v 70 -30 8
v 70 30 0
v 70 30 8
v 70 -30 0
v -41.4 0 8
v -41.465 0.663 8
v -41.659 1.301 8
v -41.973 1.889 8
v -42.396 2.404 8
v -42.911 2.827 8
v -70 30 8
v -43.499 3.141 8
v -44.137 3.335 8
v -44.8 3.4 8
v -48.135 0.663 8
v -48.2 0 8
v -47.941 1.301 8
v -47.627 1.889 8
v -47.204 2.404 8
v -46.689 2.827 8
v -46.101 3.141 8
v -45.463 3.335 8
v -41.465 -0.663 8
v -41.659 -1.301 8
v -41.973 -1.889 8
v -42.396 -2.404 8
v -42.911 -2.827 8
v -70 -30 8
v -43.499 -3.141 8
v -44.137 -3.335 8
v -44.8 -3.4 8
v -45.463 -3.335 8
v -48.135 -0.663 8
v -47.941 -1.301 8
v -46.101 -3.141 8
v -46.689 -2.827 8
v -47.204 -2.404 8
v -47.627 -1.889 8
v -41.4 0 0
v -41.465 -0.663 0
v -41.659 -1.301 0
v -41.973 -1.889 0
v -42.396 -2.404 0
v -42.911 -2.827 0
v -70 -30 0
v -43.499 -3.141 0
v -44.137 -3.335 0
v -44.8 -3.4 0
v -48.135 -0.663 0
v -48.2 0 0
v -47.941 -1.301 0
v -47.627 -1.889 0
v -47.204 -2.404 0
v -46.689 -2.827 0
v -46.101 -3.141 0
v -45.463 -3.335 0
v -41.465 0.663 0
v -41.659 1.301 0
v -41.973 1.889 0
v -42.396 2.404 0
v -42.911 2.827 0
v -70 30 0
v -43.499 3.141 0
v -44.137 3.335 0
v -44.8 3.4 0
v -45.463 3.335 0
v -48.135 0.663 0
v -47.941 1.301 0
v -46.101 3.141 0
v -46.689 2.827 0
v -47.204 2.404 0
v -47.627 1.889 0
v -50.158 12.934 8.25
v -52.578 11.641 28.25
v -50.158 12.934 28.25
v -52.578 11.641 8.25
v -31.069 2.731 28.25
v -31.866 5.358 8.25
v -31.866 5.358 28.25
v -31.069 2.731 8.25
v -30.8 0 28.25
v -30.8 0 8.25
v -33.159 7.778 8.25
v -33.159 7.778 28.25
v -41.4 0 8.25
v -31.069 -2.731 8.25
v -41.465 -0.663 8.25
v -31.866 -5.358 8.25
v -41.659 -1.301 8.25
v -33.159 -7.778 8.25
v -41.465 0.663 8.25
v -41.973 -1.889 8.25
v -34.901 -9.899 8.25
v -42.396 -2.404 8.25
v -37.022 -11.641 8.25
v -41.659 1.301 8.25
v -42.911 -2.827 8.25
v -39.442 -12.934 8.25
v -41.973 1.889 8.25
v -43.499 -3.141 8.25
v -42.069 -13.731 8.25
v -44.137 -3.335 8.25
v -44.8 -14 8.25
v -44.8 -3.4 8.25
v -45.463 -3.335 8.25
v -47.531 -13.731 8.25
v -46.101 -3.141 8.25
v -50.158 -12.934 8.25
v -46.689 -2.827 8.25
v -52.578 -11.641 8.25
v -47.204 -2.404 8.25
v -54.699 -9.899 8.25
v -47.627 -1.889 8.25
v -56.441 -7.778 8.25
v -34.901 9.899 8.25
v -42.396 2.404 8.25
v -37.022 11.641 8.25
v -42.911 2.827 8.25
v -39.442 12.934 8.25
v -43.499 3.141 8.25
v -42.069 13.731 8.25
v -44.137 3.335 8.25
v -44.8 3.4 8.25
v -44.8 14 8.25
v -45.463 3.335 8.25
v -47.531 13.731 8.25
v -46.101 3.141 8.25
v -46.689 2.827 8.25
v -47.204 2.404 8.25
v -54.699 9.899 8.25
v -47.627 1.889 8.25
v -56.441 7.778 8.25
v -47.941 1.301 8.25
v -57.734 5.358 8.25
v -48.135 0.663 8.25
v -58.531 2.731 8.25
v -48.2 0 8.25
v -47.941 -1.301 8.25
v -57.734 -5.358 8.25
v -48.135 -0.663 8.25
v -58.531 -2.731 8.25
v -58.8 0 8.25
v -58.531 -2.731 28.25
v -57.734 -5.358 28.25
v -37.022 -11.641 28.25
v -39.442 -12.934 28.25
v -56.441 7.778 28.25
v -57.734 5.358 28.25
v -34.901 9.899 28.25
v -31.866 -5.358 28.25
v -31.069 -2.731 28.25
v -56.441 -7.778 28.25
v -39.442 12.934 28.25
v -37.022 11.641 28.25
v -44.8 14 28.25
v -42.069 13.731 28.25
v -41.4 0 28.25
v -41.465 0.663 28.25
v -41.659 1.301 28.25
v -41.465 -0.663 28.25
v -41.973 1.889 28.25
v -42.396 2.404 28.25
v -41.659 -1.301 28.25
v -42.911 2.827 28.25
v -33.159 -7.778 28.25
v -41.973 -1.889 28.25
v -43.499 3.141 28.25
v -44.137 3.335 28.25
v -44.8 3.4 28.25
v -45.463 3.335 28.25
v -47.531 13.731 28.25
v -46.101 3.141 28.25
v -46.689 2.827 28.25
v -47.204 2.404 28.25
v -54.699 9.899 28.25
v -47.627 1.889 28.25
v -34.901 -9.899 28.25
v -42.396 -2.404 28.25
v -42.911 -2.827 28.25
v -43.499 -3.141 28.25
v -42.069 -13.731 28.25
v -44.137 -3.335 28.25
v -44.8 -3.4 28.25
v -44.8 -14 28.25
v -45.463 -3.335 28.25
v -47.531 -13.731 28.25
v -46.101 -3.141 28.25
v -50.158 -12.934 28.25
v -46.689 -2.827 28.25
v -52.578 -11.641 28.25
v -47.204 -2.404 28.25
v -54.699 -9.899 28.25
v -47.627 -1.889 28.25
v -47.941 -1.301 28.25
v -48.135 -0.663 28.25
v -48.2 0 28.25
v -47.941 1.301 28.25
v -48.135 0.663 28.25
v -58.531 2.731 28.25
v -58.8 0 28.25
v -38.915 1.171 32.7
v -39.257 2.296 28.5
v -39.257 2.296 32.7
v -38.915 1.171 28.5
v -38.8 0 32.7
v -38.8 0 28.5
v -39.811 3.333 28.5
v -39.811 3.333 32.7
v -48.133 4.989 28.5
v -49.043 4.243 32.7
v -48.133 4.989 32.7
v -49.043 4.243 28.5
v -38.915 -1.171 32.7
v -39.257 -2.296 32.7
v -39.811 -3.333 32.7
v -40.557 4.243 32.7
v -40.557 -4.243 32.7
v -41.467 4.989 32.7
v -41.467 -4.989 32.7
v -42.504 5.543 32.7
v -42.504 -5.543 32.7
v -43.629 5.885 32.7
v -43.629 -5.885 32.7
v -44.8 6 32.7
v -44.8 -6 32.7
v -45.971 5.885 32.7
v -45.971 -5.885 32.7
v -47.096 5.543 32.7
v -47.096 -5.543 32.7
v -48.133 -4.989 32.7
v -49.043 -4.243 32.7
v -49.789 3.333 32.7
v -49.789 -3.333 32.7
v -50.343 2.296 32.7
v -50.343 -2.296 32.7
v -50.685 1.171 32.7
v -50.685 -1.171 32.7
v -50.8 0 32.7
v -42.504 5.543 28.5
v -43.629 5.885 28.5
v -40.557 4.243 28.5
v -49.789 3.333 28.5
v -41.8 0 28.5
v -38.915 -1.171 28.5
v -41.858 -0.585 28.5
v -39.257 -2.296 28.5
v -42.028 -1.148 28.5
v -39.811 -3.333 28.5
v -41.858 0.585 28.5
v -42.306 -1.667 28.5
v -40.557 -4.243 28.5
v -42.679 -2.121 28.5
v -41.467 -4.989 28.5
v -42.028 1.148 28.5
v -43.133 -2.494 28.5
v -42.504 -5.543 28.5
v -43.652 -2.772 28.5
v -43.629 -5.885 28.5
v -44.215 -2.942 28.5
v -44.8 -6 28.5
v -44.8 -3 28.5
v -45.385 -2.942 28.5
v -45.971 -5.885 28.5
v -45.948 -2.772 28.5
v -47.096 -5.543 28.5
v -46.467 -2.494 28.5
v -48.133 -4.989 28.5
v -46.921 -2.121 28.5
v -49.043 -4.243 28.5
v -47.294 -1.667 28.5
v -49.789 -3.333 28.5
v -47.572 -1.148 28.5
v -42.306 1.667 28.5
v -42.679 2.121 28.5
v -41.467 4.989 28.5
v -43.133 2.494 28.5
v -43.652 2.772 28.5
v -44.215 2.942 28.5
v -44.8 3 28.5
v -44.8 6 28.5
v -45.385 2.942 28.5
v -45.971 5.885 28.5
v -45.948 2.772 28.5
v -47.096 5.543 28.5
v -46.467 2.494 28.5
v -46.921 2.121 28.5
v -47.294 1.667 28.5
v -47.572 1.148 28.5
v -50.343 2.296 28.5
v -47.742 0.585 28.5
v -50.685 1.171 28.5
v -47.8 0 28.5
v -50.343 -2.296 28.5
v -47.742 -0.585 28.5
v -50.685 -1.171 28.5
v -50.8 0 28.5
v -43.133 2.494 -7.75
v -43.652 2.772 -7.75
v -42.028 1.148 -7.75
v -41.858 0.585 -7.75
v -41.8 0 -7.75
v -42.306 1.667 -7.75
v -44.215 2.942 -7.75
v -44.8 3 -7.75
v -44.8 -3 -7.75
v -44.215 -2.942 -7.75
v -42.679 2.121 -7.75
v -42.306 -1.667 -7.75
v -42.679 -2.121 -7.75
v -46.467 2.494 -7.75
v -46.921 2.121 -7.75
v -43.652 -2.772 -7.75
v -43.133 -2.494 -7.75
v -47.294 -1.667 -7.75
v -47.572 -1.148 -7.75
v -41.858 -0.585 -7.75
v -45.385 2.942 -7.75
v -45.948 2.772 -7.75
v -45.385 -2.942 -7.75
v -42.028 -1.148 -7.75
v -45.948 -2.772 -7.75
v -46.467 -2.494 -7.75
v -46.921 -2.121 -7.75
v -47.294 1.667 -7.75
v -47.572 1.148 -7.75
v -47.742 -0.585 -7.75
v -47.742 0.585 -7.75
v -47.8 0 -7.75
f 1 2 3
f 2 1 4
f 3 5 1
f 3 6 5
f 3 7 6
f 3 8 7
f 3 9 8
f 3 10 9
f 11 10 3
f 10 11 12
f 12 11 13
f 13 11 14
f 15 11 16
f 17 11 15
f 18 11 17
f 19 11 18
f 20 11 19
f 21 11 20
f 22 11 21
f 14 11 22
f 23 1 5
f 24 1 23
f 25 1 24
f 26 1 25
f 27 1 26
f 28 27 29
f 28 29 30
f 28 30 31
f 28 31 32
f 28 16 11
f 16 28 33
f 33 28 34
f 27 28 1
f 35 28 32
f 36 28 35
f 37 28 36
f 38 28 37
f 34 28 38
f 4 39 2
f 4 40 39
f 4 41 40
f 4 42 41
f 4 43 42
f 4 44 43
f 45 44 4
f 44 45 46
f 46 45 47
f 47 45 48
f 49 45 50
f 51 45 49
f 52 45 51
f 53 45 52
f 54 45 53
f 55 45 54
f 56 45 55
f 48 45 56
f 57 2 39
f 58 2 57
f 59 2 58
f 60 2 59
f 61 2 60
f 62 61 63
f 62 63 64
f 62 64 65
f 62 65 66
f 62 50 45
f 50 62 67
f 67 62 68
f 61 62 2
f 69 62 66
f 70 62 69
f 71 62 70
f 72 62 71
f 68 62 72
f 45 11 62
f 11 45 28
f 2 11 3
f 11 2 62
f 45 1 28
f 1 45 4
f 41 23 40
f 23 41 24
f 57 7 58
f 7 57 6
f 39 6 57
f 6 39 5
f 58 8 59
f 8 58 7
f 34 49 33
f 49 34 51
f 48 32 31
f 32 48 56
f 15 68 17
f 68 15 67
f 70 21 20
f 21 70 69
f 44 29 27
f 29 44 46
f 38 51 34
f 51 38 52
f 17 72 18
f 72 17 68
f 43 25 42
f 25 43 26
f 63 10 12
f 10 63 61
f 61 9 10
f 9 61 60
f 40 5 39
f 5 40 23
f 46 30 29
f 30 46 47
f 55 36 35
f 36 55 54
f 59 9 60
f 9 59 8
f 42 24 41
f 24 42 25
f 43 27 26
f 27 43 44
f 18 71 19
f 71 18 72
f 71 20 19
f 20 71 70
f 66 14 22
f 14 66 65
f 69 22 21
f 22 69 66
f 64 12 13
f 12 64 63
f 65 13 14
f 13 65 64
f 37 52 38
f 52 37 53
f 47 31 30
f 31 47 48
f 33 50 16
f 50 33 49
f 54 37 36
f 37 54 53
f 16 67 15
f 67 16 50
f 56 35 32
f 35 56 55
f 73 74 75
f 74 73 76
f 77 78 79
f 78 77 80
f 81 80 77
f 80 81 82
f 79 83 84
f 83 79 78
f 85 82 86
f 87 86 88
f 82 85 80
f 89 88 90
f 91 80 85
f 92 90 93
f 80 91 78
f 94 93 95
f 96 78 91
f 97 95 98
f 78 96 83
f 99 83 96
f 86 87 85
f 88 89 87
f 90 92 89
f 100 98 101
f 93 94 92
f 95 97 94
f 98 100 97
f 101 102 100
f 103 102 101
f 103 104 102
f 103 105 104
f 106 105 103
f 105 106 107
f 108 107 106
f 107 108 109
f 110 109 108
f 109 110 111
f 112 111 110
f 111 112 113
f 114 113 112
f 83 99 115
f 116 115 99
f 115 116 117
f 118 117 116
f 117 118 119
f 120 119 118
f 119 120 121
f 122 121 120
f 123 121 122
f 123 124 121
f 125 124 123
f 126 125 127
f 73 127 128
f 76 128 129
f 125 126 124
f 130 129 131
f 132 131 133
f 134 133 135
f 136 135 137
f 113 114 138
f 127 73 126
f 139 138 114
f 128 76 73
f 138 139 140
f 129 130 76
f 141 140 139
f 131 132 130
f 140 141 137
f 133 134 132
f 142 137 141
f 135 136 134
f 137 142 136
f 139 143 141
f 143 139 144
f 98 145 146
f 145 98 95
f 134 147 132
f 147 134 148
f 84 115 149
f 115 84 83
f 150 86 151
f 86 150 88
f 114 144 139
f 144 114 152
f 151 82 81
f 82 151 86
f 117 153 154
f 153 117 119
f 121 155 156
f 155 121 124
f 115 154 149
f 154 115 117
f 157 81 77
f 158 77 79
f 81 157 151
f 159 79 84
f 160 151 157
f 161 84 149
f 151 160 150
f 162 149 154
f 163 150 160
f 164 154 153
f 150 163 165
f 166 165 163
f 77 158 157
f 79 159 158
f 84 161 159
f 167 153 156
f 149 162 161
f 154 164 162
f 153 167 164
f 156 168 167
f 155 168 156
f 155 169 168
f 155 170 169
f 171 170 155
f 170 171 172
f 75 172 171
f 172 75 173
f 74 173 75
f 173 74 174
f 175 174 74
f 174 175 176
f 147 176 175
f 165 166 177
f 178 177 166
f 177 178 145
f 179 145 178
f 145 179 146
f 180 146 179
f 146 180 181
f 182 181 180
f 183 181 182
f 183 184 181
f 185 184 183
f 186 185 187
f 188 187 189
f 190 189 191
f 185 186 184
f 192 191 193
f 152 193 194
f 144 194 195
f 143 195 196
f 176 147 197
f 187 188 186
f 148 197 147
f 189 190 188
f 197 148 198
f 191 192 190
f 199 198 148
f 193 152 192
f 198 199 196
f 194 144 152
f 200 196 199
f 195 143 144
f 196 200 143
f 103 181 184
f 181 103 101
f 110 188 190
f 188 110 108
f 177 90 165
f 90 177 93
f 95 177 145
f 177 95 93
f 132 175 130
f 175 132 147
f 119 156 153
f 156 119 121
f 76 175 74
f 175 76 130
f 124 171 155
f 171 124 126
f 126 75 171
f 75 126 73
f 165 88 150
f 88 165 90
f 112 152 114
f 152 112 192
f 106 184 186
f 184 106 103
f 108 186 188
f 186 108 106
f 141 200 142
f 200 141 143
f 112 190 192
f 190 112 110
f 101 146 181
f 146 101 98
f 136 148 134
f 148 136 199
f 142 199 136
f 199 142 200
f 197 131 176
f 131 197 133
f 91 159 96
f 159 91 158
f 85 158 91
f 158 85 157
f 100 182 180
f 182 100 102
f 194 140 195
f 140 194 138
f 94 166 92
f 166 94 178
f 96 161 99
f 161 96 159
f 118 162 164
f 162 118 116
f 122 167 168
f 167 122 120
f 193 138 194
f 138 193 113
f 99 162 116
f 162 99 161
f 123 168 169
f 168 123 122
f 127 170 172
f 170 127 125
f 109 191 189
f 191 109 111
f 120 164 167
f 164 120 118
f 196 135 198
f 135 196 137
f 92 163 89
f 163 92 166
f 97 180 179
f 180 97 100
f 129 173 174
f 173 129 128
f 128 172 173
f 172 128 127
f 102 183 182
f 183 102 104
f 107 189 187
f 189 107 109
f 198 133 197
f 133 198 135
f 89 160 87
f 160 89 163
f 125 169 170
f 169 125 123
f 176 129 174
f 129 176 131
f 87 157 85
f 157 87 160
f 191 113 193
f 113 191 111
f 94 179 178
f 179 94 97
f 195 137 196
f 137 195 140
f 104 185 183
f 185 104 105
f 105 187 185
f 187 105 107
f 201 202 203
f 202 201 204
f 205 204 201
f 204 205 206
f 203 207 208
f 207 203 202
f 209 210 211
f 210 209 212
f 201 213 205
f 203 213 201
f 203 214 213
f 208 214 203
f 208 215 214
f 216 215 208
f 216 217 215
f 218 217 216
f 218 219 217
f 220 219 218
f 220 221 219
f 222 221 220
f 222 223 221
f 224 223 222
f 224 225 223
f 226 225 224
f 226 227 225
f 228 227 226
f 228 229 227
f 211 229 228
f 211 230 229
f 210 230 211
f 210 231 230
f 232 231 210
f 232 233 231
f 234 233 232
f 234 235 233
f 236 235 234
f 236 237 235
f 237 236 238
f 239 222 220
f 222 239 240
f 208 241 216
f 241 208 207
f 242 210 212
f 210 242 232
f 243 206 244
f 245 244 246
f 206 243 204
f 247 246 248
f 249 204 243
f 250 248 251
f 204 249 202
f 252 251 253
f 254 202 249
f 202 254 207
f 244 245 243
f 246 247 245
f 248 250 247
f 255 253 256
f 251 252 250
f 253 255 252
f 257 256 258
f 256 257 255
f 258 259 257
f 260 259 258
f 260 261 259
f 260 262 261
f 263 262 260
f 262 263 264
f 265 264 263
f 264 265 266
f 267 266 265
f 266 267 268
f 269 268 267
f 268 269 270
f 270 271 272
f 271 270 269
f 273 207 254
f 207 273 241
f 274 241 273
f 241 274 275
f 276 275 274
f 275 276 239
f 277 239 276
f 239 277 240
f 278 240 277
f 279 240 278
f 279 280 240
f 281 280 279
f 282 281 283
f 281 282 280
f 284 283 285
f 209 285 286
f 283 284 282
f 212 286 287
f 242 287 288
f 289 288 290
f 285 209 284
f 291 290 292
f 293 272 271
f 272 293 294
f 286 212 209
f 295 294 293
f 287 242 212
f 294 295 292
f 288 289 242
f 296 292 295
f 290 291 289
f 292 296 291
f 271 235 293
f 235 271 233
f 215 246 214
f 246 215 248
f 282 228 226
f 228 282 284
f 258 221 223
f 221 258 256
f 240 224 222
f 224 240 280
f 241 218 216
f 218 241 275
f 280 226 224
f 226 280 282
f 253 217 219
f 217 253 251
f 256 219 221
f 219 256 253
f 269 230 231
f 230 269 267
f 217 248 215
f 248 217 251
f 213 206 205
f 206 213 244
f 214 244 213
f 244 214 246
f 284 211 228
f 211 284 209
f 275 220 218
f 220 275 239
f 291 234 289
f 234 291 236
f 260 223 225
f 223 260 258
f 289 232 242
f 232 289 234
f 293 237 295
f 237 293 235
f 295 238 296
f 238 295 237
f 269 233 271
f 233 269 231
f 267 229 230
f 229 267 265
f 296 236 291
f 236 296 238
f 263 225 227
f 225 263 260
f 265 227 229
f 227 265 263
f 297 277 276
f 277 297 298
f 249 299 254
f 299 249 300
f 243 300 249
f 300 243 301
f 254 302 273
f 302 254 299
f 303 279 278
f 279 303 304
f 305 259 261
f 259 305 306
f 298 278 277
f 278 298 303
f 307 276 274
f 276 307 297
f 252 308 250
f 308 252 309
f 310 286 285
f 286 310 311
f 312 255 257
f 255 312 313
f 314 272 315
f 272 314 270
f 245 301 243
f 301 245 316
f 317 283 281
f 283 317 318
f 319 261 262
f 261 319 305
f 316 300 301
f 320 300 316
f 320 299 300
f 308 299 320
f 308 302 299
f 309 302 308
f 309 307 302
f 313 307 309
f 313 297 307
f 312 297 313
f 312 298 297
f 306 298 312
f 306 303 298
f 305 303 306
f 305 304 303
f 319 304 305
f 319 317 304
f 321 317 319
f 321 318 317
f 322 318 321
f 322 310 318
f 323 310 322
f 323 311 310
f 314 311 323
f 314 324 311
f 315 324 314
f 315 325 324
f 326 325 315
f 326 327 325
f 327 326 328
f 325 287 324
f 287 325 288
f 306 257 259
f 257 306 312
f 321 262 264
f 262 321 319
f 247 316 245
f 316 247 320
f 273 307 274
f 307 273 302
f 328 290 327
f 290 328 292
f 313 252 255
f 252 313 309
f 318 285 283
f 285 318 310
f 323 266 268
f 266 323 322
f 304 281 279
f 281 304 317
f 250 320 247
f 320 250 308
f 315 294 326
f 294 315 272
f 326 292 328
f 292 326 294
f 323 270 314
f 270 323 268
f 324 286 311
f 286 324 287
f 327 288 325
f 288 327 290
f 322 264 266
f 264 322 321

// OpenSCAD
$fn = 32;

// ------------------------------------------------------------------------
// Standoff columns: 1 d28 standoffs, bolts d6
// Every part is its own module, assembly() places them once.
// ------------------------------------------------------------------------

// --- part 1 ---
module base_plate() {
  difference() {
    translate([-70, -30, 0]) cube([140, 60, 8]);
    translate([-44.8, 0, -1]) cylinder(h = 10, d = 6.8);
  }
}

// --- part 2 ---
module spacer() {
  difference() {
      translate([0, 0, 0]) cylinder(h = 20, d = 28);
      translate([0, 0, -1]) cylinder(h = 22, d = 6.8);
    }
}

// --- part 3 ---
module bolt() {
  cylinder(h = 4.2, d = 12);
  translate([0, 0, -36.25]) cylinder(h = 36.25, d = 6);
}

// --- assembly ---
module assembly() {
  translate([0, 0, 0]) rotate([0, 0, 0]) base_plate();
  translate([-44.8, 0, 8.25]) rotate([0, 0, 0]) spacer();
  translate([-44.8, 0, 28.5]) rotate([0, 0, 0]) bolt();
}

assembly();
